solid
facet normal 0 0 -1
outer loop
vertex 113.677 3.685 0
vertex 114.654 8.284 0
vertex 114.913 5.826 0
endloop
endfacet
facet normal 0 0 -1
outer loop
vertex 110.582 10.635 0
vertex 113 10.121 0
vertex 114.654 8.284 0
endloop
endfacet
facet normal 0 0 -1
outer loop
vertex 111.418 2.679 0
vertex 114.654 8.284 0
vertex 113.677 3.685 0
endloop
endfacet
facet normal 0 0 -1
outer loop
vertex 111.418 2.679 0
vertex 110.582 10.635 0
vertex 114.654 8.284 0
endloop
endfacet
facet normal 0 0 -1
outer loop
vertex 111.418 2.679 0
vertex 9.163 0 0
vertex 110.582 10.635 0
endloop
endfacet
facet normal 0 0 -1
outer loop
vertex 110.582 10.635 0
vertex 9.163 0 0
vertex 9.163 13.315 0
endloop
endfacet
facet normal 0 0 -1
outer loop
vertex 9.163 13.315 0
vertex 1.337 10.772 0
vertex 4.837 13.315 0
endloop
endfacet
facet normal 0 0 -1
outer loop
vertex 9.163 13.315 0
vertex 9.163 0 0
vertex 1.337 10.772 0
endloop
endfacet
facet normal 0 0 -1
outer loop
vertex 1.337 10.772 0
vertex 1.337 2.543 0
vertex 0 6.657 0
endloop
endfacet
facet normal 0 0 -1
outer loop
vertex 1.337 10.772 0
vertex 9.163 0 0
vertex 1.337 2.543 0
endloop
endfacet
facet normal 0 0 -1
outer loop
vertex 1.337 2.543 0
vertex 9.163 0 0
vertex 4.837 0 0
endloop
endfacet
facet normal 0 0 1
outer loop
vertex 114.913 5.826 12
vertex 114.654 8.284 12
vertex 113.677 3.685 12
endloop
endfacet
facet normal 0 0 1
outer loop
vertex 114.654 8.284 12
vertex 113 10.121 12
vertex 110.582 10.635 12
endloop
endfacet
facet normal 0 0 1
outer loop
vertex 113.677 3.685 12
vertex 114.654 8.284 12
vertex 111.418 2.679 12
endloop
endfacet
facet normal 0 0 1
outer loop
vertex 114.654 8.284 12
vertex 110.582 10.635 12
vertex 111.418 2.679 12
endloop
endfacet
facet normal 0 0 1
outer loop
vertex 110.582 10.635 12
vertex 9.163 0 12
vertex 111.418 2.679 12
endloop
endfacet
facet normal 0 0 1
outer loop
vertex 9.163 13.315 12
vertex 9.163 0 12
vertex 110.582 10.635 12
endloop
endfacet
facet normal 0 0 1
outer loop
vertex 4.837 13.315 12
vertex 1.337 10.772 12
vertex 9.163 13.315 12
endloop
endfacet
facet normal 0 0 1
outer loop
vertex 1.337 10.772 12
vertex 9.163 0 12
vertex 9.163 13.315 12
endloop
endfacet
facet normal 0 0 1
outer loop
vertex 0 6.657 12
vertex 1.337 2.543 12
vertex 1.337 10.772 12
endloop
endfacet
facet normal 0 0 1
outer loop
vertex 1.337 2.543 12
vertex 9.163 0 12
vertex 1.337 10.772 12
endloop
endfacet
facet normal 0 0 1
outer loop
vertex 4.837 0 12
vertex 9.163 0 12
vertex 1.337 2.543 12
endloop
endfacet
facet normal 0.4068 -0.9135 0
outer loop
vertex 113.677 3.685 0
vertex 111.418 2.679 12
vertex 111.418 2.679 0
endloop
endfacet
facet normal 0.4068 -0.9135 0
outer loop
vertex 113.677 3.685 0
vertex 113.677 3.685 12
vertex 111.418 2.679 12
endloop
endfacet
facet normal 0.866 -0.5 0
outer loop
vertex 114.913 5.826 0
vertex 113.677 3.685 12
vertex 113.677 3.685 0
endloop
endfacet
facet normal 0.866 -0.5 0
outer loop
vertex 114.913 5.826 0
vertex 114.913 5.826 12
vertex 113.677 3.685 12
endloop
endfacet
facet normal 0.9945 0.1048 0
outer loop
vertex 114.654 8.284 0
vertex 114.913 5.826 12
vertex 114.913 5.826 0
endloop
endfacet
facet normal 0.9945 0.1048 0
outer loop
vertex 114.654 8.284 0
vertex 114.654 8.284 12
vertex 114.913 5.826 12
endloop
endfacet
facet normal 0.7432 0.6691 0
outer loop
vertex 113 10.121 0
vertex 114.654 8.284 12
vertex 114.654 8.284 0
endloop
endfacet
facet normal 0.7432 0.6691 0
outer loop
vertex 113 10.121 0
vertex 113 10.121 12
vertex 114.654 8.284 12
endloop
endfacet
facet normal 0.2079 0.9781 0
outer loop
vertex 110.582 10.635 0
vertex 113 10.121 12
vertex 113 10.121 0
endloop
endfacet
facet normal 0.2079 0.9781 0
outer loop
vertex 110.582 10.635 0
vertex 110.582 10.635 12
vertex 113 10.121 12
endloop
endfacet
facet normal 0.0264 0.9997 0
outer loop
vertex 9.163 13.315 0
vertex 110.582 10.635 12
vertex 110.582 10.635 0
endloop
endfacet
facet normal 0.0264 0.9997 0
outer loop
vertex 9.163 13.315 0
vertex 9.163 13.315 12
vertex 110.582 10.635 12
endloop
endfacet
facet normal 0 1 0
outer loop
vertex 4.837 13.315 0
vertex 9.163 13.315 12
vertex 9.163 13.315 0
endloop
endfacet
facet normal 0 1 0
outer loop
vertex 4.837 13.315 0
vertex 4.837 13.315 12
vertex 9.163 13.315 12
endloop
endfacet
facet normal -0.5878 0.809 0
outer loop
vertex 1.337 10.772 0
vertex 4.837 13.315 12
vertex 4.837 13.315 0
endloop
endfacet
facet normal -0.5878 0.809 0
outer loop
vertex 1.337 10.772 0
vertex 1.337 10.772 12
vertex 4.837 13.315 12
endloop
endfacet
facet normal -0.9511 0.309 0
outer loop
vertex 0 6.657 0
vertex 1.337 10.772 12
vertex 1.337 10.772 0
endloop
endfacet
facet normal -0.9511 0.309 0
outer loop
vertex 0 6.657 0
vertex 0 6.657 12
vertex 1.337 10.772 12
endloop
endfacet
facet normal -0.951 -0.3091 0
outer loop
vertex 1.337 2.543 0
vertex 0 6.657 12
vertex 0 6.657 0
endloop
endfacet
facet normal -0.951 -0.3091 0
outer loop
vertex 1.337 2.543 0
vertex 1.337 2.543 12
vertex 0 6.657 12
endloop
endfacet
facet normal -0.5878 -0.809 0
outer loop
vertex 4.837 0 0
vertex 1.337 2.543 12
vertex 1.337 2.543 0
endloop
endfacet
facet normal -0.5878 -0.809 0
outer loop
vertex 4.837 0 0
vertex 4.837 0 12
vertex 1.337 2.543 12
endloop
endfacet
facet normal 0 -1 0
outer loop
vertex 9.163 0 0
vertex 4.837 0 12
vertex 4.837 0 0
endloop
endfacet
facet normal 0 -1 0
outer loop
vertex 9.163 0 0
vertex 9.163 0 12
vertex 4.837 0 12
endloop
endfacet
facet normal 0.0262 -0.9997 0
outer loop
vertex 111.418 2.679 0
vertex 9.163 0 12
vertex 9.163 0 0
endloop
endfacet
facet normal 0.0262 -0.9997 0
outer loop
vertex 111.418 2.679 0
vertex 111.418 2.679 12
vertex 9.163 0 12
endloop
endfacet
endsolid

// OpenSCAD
$fn = 32;

// ----------------------------------------------------------------------
// Lever arm: two bosses 14 and 8 mm, 65 mm between centres
// ----------------------------------------------------------------------

// --- parameters (mm) ---
profile_height = 12;      // extrusion height
profile_points = 13;      // points of the closed outline

profile = [[0, 6.657], [1.337, 2.543], [4.837, 0], [9.163, 0], [111.418, 2.679], [113.677, 3.685], [114.913, 5.826], [114.654, 8.284], [113, 10.121], [110.582, 10.635], [9.163, 13.315], [4.837, 13.315], [1.337, 10.772]];  // single closed polygon, 13 points, counter clockwise

// --- the one profile operation ---
linear_extrude(height = profile_height) polygon(points = profile);
